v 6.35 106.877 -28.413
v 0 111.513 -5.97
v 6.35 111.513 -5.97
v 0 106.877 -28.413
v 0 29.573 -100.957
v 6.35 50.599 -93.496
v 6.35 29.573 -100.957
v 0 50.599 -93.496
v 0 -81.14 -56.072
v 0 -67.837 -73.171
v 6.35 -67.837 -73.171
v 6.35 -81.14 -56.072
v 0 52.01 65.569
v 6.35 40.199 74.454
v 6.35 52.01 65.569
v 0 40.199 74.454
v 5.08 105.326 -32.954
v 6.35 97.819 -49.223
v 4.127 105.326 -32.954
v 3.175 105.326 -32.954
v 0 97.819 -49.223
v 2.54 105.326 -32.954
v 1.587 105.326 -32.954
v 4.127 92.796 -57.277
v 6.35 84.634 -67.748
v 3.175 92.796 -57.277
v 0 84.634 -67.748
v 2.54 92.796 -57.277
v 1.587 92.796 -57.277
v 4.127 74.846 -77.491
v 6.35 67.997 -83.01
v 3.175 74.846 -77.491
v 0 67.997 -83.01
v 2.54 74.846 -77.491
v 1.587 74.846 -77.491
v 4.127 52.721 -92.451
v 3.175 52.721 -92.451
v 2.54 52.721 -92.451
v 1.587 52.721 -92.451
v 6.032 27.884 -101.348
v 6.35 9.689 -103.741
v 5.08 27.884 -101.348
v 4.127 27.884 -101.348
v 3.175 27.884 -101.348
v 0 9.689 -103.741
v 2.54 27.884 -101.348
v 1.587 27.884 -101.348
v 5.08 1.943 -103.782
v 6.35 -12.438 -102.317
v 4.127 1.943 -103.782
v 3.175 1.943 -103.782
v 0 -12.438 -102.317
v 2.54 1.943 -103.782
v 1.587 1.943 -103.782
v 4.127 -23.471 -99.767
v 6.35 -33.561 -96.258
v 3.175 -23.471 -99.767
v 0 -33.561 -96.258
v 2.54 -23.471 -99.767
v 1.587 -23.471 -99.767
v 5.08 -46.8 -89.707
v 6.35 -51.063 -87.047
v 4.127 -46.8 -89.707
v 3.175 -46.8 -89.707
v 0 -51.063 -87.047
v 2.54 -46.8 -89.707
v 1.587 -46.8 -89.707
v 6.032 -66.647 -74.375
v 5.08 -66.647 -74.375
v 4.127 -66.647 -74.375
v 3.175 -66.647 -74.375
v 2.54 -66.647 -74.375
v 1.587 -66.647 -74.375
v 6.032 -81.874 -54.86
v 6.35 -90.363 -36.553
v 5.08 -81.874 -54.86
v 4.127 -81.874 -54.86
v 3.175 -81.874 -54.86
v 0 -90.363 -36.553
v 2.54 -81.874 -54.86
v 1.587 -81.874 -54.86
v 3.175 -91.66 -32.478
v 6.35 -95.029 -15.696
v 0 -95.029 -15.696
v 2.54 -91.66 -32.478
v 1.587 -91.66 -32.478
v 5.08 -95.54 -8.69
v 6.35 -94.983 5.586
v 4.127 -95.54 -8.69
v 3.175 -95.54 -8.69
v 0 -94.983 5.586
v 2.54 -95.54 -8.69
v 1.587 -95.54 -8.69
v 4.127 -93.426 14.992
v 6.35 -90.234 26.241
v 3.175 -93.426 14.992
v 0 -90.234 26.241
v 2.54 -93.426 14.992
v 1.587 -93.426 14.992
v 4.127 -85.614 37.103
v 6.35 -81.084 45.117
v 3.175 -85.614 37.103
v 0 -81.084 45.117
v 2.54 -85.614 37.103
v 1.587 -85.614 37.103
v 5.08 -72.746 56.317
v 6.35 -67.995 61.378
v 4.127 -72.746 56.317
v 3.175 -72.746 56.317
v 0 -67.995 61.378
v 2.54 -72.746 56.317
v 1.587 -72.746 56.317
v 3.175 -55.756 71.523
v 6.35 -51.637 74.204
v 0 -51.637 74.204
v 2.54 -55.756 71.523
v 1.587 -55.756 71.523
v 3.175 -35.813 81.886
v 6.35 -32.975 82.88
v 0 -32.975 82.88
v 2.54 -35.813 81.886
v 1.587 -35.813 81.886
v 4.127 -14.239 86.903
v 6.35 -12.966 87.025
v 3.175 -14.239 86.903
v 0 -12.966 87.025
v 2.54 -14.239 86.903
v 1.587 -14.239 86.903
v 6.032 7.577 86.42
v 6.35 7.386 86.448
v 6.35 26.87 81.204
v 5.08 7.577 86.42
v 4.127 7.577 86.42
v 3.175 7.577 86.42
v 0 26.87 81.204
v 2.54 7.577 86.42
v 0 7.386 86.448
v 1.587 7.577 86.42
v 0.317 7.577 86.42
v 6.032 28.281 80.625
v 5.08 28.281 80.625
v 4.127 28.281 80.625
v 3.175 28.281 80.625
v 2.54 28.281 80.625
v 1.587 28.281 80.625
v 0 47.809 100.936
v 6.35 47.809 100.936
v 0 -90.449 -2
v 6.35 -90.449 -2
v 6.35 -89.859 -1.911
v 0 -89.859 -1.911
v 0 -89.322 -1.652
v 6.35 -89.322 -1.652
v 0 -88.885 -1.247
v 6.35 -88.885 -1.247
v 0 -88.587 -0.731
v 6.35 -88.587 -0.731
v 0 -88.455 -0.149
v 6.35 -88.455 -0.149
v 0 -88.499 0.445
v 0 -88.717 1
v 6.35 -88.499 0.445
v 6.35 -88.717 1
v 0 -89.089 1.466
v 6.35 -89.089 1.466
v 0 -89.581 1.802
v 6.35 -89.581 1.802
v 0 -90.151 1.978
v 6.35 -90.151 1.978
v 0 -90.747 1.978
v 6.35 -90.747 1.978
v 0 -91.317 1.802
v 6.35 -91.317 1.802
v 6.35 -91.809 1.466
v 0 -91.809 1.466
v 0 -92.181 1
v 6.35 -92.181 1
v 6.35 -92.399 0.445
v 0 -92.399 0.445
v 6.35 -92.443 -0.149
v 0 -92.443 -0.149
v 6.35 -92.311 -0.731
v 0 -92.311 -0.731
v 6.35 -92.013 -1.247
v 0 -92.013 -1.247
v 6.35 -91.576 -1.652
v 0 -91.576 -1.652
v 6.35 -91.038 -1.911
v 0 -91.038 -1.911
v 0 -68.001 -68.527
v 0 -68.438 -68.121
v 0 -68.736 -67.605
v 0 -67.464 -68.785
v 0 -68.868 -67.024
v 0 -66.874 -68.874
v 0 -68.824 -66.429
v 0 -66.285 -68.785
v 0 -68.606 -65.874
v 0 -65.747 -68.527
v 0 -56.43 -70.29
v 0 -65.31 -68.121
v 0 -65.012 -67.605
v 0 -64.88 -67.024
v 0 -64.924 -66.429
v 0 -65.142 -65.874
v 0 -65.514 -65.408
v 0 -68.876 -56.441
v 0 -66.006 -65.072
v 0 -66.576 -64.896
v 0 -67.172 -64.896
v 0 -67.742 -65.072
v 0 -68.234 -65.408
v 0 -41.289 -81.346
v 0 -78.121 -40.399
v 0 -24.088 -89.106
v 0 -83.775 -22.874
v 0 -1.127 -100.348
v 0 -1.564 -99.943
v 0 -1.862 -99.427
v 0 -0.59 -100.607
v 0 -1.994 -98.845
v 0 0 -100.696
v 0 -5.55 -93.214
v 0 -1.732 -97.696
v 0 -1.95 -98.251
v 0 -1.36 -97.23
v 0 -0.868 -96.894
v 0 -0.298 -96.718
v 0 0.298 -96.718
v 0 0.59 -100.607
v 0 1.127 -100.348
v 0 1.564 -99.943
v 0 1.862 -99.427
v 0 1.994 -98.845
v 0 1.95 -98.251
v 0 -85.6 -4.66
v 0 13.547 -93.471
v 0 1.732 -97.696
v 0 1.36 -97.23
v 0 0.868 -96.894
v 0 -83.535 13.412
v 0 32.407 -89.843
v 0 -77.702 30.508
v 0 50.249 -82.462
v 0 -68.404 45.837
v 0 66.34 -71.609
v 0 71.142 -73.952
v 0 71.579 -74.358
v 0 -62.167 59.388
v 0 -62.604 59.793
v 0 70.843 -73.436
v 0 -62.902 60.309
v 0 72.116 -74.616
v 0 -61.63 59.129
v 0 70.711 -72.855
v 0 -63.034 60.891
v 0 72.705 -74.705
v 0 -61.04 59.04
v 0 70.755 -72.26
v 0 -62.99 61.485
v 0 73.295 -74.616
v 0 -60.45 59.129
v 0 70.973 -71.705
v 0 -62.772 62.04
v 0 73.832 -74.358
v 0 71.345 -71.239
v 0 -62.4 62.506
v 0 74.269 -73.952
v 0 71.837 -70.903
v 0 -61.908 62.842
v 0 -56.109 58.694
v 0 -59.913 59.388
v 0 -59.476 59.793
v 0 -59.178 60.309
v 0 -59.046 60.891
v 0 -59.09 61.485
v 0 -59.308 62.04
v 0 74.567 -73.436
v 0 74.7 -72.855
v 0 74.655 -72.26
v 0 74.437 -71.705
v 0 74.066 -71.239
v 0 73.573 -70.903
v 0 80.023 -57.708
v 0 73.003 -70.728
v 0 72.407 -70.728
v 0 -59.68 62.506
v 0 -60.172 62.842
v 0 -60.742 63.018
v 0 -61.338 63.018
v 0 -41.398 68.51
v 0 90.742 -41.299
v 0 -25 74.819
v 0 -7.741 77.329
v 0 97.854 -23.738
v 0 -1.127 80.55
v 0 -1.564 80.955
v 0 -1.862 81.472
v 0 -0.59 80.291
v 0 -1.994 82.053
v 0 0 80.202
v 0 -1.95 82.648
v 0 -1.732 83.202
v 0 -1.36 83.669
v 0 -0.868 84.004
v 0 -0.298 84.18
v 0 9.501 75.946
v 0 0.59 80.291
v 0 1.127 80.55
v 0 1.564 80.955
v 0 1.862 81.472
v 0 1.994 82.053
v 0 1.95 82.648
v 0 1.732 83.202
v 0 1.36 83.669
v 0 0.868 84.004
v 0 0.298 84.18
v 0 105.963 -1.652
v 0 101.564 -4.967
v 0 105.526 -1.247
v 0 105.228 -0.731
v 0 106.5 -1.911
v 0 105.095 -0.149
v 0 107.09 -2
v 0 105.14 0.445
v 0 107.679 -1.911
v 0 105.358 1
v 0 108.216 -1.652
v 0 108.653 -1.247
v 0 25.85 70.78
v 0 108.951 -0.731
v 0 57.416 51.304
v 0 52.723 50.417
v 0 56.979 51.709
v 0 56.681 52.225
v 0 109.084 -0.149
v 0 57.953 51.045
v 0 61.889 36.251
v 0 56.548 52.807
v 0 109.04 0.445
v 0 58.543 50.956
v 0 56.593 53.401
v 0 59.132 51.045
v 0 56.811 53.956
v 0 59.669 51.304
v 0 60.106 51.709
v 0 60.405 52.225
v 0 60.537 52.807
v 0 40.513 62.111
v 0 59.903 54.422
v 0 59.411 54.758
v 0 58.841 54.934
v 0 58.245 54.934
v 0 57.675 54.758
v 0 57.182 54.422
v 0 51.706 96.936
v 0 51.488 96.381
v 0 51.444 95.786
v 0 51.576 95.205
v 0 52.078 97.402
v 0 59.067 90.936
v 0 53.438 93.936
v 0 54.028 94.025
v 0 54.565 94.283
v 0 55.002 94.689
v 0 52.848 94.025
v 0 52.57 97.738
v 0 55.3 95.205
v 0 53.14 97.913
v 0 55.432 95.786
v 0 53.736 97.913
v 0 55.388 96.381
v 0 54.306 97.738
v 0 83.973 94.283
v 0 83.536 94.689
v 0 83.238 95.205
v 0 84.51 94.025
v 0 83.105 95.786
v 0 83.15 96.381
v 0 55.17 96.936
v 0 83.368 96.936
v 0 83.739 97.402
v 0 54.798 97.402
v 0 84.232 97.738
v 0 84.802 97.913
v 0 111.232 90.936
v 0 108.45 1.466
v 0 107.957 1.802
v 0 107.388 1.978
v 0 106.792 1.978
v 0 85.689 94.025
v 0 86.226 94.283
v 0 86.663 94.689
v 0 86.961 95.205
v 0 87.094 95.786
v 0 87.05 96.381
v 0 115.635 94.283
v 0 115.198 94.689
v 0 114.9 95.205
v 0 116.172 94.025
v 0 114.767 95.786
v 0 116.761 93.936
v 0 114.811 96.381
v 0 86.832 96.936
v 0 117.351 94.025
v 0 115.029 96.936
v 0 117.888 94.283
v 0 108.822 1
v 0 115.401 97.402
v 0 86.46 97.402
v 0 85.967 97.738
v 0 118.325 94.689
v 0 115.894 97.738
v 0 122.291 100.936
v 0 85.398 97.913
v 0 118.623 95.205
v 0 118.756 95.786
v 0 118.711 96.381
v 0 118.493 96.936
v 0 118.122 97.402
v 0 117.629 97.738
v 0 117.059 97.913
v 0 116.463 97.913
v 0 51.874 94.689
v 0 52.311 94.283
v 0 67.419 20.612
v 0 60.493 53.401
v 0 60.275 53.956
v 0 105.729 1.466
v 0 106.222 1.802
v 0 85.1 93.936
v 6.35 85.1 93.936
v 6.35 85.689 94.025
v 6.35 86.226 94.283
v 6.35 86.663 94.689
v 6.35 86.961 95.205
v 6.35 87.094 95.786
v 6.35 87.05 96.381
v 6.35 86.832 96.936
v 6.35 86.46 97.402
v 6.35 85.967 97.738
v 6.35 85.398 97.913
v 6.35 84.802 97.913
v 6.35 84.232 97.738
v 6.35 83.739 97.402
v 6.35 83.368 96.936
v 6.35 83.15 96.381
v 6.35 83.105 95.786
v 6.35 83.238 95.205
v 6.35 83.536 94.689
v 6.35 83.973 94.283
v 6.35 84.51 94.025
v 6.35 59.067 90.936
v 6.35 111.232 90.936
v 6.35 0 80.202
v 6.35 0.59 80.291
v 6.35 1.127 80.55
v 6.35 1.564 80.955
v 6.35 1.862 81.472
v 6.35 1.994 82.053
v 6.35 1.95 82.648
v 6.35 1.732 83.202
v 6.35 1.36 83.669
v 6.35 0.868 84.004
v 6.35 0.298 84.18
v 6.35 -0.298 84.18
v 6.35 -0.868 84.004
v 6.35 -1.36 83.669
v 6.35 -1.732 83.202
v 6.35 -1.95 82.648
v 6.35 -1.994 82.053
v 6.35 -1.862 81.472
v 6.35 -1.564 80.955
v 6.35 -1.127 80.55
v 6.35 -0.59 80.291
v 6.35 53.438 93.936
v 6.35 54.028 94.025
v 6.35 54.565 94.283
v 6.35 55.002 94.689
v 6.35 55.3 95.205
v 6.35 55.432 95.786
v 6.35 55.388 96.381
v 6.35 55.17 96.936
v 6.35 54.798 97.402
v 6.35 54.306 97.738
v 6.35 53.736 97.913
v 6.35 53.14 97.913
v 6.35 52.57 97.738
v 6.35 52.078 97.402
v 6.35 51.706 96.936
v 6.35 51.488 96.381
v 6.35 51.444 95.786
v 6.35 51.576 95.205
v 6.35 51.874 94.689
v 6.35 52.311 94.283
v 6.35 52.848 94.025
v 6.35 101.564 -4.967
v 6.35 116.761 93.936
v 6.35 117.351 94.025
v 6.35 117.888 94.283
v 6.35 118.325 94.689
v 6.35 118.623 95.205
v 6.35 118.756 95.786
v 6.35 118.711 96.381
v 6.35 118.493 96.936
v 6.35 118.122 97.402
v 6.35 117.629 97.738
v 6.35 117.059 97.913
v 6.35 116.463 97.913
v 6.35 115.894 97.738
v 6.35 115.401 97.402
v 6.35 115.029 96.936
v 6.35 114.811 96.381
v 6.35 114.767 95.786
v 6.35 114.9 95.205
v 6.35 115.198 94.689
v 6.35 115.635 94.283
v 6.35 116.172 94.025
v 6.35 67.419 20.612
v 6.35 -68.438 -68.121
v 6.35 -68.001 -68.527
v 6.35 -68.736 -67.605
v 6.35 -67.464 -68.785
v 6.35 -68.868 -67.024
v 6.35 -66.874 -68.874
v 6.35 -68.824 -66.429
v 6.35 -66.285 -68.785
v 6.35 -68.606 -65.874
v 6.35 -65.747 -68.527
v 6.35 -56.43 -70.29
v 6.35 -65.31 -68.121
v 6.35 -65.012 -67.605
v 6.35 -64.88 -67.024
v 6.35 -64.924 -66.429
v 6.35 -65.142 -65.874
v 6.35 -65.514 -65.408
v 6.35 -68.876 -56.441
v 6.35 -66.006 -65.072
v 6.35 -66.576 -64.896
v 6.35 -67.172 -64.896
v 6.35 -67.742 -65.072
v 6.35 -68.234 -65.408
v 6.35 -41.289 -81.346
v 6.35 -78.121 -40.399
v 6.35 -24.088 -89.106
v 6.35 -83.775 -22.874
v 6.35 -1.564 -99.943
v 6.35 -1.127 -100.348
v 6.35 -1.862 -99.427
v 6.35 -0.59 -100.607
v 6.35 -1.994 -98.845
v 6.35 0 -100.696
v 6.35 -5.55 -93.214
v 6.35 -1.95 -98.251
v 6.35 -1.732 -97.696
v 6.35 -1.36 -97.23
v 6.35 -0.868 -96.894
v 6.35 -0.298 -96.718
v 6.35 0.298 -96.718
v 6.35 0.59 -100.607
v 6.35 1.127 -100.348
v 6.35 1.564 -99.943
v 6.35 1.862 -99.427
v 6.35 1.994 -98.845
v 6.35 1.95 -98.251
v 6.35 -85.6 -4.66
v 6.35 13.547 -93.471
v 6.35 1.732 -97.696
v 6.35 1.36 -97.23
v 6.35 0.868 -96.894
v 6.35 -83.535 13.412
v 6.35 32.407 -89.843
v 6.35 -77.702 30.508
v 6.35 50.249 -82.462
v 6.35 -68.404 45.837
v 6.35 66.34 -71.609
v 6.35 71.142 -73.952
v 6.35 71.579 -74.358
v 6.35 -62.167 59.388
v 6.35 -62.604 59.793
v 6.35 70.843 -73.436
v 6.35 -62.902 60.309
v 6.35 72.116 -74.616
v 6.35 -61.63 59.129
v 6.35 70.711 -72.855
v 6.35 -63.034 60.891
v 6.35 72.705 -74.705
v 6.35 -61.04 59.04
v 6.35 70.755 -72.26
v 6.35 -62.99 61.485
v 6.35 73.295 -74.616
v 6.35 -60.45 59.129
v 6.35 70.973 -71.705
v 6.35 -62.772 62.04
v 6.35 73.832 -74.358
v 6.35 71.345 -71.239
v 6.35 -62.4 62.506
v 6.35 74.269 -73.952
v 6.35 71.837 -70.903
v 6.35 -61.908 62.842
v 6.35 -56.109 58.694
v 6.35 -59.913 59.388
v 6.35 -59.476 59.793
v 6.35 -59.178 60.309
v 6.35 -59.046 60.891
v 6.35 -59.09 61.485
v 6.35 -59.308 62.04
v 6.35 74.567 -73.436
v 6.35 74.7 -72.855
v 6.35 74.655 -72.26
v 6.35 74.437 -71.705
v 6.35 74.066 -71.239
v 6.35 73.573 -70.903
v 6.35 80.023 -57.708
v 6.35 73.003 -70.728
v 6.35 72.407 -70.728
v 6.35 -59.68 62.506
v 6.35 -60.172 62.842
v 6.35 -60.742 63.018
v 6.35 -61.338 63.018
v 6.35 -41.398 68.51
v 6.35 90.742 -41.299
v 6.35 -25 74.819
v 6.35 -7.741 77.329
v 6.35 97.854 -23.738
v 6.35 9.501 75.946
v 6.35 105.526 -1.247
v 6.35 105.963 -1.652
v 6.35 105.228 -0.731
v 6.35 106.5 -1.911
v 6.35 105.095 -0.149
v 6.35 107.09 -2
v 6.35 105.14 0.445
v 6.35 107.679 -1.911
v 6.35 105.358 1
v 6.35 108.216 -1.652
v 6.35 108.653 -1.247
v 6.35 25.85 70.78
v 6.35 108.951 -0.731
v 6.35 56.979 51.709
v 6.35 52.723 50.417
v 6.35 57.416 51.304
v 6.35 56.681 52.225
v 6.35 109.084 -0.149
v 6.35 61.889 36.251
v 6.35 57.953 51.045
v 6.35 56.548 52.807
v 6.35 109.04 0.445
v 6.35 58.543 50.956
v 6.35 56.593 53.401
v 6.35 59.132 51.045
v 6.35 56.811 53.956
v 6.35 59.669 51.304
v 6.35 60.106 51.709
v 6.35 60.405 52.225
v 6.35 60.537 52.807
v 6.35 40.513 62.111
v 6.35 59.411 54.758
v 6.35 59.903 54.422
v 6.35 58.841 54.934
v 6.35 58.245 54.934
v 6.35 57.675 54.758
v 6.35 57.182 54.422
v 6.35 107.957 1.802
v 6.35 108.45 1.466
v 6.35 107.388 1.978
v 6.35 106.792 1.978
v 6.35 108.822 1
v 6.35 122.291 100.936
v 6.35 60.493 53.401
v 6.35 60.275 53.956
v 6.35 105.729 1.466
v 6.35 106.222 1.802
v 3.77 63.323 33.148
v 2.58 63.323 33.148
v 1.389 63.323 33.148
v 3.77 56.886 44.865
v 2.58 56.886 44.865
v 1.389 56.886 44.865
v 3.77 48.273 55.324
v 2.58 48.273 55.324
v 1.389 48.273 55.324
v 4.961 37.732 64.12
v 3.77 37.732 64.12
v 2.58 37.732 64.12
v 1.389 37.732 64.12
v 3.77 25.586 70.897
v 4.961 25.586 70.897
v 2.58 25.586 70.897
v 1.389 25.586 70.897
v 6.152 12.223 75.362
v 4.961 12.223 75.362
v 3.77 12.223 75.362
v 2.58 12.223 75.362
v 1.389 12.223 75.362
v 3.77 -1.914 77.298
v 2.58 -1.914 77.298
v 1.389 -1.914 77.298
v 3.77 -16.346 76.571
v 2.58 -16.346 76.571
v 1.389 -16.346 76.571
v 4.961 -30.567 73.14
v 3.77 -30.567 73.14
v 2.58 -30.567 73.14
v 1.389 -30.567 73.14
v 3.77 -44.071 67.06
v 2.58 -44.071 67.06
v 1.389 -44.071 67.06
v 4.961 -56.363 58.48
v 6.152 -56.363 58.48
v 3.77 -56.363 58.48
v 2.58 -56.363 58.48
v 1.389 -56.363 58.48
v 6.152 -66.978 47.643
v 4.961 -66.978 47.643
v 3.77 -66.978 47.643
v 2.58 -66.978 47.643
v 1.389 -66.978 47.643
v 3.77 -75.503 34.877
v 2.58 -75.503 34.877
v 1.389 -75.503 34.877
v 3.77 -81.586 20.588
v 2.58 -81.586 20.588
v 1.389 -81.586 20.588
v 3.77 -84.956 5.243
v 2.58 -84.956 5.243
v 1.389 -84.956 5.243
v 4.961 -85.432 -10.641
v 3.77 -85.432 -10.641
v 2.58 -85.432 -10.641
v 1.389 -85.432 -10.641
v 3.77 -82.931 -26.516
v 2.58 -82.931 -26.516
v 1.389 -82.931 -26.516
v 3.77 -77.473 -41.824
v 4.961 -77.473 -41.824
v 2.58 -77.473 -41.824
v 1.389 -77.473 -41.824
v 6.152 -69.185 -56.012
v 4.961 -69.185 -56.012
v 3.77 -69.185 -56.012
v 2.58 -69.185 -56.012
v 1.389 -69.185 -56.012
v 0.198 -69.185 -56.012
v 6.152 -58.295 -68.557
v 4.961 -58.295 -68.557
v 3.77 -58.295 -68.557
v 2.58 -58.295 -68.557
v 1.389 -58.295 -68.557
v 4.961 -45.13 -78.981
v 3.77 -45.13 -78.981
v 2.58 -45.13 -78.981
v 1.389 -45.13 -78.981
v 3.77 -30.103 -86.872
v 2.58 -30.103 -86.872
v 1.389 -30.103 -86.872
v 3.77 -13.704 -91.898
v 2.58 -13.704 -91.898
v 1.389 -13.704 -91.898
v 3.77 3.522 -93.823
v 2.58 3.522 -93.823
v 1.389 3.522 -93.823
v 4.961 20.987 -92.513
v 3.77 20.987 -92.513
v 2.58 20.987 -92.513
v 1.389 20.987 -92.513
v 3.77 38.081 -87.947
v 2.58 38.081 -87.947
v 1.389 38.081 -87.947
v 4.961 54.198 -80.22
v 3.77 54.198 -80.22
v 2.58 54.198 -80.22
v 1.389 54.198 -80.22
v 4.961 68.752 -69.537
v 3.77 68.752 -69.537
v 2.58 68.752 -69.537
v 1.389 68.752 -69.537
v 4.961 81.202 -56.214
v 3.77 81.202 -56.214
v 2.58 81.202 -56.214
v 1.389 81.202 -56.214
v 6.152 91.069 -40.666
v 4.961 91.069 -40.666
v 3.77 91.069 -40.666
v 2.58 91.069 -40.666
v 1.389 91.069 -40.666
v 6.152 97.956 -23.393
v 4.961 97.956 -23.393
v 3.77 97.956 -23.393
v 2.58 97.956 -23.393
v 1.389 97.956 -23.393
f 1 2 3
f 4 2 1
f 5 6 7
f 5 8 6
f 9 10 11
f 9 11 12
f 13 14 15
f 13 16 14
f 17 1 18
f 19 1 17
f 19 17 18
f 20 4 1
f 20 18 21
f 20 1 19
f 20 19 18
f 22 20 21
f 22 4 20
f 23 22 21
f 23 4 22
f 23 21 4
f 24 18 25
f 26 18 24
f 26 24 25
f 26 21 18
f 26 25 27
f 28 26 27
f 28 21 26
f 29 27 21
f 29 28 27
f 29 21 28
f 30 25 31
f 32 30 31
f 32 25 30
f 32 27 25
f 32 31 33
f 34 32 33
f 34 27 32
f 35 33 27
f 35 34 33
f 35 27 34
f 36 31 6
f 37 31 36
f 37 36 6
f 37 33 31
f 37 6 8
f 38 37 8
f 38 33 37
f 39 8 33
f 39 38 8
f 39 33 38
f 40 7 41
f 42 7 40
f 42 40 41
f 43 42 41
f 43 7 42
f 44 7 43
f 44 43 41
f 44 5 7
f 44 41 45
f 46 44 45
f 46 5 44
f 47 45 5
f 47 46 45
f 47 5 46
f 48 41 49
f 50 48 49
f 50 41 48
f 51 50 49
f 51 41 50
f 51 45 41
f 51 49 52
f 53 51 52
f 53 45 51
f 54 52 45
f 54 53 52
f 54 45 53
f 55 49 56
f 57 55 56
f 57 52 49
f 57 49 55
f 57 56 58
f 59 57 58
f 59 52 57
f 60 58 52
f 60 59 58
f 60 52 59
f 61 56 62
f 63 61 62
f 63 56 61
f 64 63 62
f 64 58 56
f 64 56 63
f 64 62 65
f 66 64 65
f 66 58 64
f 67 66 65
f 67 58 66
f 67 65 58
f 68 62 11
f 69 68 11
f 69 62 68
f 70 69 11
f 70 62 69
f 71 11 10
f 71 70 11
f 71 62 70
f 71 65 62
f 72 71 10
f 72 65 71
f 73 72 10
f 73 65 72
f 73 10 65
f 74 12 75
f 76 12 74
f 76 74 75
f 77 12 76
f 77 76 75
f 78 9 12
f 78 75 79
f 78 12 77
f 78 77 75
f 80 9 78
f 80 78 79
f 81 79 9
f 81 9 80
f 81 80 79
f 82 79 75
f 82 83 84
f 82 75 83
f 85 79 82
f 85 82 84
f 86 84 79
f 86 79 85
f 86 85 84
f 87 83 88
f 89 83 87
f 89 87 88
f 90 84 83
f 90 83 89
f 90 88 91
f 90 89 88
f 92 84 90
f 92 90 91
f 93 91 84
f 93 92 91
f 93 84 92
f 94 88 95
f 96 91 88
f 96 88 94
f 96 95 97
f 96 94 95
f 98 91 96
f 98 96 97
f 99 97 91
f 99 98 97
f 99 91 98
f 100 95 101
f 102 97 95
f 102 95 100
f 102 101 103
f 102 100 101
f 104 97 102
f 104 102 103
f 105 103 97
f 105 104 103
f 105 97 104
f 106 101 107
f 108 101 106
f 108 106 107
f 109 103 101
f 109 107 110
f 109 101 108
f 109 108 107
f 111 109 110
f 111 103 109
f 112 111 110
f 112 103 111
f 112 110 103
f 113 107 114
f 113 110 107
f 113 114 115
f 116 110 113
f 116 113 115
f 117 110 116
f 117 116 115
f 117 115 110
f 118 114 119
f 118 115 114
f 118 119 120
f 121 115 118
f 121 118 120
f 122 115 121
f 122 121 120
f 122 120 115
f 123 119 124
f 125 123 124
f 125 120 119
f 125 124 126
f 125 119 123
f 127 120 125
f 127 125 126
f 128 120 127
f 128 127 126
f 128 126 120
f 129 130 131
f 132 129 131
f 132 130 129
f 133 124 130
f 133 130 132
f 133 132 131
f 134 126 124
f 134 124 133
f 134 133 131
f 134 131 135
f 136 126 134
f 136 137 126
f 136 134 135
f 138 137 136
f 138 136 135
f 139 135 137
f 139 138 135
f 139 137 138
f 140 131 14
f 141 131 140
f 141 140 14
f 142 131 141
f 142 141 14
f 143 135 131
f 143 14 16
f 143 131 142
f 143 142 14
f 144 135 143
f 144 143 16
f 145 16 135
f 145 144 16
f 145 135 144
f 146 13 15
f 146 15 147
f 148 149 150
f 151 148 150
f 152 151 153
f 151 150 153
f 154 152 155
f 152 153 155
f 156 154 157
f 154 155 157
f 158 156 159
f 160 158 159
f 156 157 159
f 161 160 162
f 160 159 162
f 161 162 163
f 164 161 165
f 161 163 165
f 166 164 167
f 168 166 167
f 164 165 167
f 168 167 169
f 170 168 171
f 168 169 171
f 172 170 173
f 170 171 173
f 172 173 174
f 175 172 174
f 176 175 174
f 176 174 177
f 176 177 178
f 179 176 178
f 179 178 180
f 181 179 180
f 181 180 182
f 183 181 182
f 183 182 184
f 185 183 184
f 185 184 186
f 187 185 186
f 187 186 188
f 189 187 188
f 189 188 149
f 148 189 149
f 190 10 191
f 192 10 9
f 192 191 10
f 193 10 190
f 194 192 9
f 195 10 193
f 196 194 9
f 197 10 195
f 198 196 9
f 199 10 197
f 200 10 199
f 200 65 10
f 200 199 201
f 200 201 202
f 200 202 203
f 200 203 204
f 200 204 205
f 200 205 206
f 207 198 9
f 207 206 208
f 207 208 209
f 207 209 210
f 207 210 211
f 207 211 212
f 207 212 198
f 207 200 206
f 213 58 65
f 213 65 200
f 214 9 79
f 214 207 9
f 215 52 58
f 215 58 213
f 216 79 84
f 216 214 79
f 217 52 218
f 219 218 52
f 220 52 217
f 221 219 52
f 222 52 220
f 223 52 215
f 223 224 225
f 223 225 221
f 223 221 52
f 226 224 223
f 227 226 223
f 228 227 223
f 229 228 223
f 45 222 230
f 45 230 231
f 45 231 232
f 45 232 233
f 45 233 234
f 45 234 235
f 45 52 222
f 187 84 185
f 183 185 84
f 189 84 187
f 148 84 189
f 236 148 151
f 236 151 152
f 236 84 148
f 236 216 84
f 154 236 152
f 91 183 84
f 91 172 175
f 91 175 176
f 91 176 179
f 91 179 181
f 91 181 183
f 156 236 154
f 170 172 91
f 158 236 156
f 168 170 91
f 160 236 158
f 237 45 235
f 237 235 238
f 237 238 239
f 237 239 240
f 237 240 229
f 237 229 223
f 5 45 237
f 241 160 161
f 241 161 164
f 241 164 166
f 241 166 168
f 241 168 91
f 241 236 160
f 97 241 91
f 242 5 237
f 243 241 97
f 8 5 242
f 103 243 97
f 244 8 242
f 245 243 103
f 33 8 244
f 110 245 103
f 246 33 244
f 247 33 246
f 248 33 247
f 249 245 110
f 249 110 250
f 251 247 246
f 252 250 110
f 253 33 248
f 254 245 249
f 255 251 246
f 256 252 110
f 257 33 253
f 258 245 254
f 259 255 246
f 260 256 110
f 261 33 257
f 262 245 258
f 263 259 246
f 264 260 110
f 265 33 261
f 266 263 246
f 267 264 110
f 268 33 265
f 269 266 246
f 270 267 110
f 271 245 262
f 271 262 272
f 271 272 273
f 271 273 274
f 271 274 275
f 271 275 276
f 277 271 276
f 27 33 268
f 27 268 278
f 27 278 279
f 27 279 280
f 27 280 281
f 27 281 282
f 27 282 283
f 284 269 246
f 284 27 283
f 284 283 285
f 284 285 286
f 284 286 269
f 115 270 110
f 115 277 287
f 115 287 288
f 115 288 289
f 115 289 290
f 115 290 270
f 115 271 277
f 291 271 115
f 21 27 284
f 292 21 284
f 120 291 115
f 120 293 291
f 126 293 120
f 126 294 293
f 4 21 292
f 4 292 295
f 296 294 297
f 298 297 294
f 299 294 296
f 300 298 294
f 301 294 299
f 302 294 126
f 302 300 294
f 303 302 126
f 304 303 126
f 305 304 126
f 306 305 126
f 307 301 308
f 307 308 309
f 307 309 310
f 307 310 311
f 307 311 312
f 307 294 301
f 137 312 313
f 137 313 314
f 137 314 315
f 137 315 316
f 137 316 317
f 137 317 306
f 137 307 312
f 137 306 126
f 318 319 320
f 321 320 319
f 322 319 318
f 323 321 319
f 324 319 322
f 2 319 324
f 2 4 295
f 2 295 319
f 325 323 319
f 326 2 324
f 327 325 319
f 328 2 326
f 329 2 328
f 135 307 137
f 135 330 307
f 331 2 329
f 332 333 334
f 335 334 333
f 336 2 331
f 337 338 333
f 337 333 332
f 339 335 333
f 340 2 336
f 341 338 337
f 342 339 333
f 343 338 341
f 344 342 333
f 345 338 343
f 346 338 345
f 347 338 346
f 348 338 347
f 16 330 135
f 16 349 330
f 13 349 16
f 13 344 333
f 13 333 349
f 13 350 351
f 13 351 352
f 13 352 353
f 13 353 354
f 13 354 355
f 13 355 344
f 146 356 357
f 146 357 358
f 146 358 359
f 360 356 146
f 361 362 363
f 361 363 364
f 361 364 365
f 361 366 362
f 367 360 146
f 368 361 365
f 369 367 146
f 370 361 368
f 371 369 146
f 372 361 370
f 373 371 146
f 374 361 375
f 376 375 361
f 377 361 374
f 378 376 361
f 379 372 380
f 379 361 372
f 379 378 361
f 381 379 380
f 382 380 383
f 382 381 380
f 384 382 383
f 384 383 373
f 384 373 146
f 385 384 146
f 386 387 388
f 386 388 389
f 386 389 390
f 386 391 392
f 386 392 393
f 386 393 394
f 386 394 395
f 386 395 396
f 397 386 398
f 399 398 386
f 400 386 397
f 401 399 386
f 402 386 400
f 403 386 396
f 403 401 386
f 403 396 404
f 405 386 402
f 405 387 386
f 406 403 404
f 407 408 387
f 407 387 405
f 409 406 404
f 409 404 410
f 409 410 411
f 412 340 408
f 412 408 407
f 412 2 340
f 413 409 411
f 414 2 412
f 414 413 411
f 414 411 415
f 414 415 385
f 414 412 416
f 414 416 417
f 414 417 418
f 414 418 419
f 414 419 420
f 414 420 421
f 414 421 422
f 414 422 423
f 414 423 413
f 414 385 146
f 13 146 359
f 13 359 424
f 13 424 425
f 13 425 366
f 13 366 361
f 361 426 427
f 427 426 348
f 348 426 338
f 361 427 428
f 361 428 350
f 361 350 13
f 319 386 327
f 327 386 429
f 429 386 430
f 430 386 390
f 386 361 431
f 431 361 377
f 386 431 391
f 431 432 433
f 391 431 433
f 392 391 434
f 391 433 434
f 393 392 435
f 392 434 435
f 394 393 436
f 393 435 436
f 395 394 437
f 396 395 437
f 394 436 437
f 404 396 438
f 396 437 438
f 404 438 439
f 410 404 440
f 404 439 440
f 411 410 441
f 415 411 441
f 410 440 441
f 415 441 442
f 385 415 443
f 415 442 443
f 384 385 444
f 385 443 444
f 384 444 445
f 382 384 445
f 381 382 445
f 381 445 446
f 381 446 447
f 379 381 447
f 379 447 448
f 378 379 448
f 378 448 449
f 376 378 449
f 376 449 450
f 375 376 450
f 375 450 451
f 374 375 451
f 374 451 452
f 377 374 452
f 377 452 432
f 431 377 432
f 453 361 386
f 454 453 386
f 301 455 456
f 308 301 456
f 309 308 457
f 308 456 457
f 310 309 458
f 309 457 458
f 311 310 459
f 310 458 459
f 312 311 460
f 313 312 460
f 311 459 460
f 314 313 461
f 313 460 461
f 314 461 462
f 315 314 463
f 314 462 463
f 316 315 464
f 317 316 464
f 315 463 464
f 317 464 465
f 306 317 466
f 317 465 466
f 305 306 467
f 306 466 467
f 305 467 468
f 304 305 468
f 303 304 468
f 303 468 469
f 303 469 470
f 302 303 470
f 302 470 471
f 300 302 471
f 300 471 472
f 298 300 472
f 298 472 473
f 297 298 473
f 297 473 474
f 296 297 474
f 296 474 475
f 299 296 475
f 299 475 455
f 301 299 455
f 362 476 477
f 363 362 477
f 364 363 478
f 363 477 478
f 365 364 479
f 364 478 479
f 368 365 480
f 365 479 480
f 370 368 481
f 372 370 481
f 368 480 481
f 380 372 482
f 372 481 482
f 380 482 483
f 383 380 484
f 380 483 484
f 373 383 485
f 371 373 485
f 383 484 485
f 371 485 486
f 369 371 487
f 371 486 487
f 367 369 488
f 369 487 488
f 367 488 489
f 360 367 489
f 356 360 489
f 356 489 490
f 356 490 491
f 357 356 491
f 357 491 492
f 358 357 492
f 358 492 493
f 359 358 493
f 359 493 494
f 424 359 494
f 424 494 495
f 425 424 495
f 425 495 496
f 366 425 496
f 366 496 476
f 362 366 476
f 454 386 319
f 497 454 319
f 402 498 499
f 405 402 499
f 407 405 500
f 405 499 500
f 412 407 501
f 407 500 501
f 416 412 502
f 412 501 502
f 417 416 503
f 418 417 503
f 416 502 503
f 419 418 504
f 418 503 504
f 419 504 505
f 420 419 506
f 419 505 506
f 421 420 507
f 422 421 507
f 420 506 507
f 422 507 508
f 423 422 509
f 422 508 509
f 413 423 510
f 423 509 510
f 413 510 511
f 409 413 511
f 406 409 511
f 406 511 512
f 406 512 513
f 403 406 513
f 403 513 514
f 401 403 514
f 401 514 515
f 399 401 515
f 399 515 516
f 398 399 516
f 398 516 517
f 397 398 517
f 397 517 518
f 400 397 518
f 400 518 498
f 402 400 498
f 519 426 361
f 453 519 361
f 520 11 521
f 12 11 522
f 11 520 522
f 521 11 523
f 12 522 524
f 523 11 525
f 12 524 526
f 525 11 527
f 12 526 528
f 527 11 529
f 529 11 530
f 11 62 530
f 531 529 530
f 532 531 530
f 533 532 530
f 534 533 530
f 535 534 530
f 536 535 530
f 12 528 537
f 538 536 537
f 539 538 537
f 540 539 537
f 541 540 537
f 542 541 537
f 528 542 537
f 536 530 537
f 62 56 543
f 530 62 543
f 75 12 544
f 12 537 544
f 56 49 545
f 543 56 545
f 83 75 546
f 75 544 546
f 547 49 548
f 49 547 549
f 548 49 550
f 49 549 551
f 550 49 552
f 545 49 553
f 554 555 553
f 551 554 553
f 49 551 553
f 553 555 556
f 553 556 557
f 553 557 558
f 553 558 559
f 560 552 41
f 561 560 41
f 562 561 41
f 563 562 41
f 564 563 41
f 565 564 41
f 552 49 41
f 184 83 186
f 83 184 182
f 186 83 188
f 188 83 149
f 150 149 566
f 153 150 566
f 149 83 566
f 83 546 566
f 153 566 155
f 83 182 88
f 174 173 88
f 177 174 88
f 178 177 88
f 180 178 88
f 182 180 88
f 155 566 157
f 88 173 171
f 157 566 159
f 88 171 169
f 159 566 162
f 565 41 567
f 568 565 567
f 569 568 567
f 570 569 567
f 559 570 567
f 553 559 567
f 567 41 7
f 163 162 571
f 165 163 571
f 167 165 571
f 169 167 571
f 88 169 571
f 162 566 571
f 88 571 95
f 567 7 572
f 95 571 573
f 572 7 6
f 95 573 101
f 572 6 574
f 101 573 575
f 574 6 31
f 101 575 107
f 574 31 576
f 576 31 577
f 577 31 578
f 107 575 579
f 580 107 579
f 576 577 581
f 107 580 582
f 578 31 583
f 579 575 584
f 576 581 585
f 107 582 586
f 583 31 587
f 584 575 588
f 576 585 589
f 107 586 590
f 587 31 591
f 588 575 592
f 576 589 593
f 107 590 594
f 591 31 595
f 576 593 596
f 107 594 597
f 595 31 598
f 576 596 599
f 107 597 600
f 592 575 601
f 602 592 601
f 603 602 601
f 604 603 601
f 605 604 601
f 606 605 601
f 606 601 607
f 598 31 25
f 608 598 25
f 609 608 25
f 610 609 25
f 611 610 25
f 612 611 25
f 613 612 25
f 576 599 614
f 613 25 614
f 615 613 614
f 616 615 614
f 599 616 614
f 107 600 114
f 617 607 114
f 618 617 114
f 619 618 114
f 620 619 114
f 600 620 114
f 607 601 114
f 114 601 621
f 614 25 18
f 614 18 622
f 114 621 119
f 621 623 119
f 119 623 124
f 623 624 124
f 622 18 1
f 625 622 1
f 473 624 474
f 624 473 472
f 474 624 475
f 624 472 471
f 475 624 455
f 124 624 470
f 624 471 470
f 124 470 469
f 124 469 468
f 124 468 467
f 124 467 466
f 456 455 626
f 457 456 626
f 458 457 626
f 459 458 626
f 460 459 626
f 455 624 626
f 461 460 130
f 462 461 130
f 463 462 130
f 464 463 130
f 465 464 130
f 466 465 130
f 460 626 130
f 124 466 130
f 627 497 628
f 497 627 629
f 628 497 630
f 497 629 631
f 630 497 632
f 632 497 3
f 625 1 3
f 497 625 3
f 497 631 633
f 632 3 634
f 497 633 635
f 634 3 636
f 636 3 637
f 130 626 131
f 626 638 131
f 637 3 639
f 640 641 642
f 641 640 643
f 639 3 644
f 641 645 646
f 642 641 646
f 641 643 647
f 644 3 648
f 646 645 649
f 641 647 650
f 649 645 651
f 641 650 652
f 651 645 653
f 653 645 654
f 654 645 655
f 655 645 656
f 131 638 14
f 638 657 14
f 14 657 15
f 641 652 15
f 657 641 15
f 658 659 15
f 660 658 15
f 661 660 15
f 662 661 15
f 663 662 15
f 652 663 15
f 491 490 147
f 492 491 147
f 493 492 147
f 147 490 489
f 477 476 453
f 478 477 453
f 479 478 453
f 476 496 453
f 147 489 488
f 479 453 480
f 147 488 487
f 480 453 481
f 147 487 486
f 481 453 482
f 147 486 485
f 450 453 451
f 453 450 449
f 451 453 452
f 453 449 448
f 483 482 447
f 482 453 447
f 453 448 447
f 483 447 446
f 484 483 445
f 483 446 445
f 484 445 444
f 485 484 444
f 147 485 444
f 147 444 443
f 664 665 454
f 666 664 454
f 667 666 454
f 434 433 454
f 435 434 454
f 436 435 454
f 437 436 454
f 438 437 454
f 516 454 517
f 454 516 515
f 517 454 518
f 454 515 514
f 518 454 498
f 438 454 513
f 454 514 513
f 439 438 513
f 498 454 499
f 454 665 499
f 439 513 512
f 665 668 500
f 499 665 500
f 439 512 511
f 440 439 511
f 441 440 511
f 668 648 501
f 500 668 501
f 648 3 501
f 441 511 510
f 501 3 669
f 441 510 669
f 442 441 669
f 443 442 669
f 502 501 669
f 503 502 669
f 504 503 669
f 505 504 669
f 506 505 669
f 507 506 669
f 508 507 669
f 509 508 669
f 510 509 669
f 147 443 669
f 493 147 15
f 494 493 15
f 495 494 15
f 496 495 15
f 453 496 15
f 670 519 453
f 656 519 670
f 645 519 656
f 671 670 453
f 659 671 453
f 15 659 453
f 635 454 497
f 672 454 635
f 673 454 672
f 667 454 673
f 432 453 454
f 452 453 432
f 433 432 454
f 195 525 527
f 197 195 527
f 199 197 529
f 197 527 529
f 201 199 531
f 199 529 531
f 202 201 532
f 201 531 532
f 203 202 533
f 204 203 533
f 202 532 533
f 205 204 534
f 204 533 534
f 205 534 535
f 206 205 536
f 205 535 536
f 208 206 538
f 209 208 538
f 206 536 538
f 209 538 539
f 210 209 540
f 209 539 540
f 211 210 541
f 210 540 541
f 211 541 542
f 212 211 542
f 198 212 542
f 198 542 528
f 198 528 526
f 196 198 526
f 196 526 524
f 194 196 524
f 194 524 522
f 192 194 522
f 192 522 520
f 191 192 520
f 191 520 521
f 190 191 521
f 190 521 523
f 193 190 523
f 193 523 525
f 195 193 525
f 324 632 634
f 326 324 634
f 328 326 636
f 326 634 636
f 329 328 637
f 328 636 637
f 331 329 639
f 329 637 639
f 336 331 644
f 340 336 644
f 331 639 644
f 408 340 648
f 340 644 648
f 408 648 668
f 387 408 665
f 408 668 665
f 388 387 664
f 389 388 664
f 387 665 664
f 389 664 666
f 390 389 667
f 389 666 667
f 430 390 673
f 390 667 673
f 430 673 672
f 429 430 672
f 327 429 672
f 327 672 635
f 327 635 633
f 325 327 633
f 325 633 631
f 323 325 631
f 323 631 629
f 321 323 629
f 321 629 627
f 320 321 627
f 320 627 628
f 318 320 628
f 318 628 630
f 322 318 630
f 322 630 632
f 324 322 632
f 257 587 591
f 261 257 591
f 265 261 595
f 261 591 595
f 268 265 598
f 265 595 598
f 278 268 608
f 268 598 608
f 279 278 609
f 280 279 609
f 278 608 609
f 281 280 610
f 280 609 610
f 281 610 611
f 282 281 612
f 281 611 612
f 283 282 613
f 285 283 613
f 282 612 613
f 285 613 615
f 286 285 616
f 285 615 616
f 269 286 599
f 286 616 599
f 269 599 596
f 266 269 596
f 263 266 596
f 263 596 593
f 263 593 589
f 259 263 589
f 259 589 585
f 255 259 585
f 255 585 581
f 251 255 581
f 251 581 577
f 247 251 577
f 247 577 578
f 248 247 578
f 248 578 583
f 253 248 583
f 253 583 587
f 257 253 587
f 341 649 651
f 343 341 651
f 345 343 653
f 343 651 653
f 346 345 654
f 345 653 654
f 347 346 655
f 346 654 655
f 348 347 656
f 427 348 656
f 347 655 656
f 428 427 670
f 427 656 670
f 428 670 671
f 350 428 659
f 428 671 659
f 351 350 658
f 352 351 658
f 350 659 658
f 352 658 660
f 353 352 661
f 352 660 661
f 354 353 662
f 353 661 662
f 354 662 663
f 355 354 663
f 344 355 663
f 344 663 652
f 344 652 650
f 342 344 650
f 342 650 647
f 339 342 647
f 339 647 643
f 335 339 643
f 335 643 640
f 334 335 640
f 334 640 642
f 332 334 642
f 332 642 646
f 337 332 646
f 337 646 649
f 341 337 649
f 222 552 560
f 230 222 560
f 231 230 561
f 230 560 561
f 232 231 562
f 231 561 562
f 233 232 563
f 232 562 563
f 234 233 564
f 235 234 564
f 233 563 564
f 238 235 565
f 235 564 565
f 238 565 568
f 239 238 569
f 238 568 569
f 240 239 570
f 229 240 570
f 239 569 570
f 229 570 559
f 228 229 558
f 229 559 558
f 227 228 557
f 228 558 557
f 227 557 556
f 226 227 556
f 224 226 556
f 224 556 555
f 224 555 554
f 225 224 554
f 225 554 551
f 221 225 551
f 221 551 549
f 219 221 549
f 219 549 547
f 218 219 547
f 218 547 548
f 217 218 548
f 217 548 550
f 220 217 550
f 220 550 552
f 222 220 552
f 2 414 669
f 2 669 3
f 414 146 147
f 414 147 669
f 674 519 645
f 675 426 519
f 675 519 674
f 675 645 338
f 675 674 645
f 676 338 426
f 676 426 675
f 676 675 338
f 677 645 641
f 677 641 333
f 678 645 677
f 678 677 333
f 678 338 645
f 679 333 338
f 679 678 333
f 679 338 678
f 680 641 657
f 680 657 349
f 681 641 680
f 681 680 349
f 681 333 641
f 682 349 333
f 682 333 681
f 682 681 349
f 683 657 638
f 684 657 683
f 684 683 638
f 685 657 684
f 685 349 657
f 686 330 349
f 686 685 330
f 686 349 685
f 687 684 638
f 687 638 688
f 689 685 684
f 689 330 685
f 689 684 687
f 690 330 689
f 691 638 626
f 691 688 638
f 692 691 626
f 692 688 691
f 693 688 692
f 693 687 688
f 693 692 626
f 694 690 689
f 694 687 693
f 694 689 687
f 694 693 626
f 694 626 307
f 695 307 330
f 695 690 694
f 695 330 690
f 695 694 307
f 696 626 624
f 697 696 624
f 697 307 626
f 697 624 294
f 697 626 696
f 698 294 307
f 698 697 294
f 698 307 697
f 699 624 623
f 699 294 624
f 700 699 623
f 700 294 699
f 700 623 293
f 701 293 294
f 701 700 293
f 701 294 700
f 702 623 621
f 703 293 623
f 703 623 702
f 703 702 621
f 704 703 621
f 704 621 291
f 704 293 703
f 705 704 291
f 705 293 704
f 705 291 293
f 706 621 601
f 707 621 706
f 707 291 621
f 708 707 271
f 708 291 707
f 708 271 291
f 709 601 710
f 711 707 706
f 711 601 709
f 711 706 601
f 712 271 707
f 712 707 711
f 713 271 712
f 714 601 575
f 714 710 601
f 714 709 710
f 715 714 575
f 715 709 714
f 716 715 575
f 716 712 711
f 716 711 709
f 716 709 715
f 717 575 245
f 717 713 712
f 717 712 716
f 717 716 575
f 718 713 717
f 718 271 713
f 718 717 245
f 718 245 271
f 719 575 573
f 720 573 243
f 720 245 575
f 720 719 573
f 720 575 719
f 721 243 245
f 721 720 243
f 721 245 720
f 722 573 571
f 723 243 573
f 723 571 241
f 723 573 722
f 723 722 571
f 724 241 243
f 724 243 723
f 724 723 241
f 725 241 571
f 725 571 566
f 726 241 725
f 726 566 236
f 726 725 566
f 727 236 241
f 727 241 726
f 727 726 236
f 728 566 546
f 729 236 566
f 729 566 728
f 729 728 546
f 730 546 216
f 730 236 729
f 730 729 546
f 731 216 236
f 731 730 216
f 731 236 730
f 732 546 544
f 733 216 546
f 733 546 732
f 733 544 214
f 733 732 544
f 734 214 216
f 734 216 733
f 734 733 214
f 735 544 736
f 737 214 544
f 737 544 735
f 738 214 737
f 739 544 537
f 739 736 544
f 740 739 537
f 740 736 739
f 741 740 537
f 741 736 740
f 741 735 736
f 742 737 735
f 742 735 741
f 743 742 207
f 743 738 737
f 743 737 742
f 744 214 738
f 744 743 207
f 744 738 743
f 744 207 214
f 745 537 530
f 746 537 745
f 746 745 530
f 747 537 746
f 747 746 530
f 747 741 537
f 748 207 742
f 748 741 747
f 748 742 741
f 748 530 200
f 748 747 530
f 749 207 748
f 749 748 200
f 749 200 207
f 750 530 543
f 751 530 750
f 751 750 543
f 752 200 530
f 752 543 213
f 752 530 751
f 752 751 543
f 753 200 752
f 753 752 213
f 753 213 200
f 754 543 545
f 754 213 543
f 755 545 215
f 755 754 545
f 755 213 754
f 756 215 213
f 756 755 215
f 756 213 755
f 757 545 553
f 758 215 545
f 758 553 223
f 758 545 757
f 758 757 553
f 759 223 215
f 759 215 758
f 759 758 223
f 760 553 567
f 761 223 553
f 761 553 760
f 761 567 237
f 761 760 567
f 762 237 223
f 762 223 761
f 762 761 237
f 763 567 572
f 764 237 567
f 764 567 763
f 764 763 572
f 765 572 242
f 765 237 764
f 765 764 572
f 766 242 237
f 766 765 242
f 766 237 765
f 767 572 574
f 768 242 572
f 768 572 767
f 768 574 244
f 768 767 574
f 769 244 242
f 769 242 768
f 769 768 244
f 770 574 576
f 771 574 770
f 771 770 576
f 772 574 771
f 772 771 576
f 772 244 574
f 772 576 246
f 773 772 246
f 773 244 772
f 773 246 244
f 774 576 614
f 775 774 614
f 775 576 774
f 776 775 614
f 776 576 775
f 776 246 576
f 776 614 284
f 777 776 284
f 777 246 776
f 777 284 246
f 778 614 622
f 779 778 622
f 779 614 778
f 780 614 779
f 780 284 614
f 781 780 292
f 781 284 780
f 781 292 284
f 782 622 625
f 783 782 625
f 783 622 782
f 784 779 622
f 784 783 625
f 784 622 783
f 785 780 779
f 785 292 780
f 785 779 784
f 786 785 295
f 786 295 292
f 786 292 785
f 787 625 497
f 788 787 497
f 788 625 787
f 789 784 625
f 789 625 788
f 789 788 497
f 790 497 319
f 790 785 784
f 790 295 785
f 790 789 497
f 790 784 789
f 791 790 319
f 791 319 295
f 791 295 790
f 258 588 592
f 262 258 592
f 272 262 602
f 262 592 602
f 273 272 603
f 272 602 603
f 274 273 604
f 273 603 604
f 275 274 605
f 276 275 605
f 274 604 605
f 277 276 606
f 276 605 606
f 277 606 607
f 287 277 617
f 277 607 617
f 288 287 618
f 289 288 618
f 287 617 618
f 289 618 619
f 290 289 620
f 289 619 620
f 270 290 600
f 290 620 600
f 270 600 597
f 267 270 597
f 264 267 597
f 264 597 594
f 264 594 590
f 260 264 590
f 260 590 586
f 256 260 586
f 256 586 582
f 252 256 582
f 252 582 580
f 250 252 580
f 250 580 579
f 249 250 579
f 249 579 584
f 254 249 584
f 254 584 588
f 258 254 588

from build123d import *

# Parameters (mm, degrees)
BOSS_EXTRUDE1_DEPTH = 6.35
SKETCH11_R          = 2
CUT_EXTRUDE2_DEPTH  = 10


with BuildPart() as part:
    # Sketch10 → Boss-Extrude1 (new body)
    with BuildSketch(Plane(origin=(0, 0, 0), x_dir=(0, 0, -1), z_dir=(1, 0, 0))):
        with BuildLine():
            Line((-65.56933734, 52.009531221), (-100.935679824, 47.808985699))
            Line((-100.935679824, 47.808985699), (-100.935679824, 122.29075479))
            Line((-100.935679824, 122.29075479), (5.970340966, 111.513169224))
            add(Edge.make_bspline(
                [(5.970340966, 111.513169224), (9.050174513, 111.20267998), (15.195754527, 110.322198965), (27.224457069, 107.560584888), (41.672600889, 102.269141777), (57.583217011, 93.200335773), (76.34944741, 77.877389952), (94.274449289, 53.53377411), (104.843460982, 19.443777188), (103.677945005, -15.636484697), (91.289552438, -47.848309946), (69.405777179, -73.770277552), (40.739036605, -90.784845908), (8.654881454, -97.341351398), (-23.220610692, -93.091773694), (-51.414586087, -78.887047742), (-72.979776783, -56.641213756), (-85.804607758, -29.085280645), (-88.816261681, 0.571051967), (-83.191535024, 24.252063706), (-74.366432128, 41.075630131), (-68.698633198, 48.535069634), (-65.56933734, 52.009531221)],
                knots=[0.103071112, 0.103071112, 0.103071112, 0.103071112, 0.117085626, 0.13110014, 0.159129168, 0.187158196, 0.215187223, 0.271245279, 0.327303334, 0.38336139, 0.439419445, 0.495477501, 0.551535556, 0.607593612, 0.663651667, 0.719709723, 0.775767778, 0.831825834, 0.887883889, 0.943941945, 0.971970972, 1, 1, 1, 1], degree=3))
        make_face()
        with BuildLine():
            Line((-20.612205183, 67.419485295), (-90.935679824, 59.066997144))
            Line((-90.935679824, 59.066997144), (-90.935679824, 111.231929858))
            Line((-90.935679824, 111.231929858), (4.967288842, 101.563602076))
            add(Edge.make_bspline(
                [(-20.612205183, 67.419485295), (-24.877082573, 66.455267856), (-29.081224373, 65.085352217), (-37.21559395, 61.560478152), (-41.145637536, 59.405543875), (-48.584738117, 54.365833517), (-52.093616671, 51.481116625), (-58.554517239, 45.064659766), (-61.506373232, 41.533012683), (-66.733754258, 33.93084433), (-69.009132051, 29.860447027), (-72.785201264, 21.31099306), (-74.285770034, 16.832087637), (-76.439055333, 7.613754029), (-77.091678837, 2.874499464), (-77.504351301, -6.703367116), (-77.264340924, -11.541788953), (-75.877767223, -21.149276623), (-74.731181162, -25.918142271), (-71.549462985, -35.216137703), (-69.514346369, -39.745064349), (-64.605672967, -48.397213397), (-61.732170197, -52.520237022), (-55.227886345, -60.20508067), (-51.597196674, -63.766713581), (-43.688569666, -70.189562344), (-39.41075863, -73.050609782), (-30.343511502, -77.954720143), (-25.554232771, -79.997639846), (-15.620993672, -83.174272641), (-10.477216691, -84.30787342), (-0.008113237, -85.604846154), (5.317009901, -85.76814141), (15.965310371, -85.096533315), (21.28827135, -84.261592387), (31.744712207, -81.600321197), (36.87797025, -79.773994641), (46.77003278, -75.172055644), (51.528617832, -72.396488903), (60.495574952, -65.972727389), (64.703737934, -62.324619511), (72.409763445, -54.264994481), (75.907434968, -49.853603117), (82.054093398, -40.405990072), (84.702914605, -35.369929323), (89.040569877, -24.836599811), (90.729269998, -19.339522034), (93.066981329, -8.06752417), (93.715895777, -2.292818854), (93.929415548, 9.337436952), (93.493965482, 15.192756131), (91.531515002, 26.780331551), (90.004503349, 32.512347913), (85.890076353, 43.649598298), (83.302695164, 49.054592305), (77.136723273, 59.34149905), (73.55821175, 64.223180225), (65.515517909, 73.281690263), (61.051457803, 77.458304454), (51.376519854, 84.946163767), (46.165803684, 88.257219093), (35.165447244, 93.88079599), (29.376003057, 96.19315988), (17.40973727, 99.718780964), (11.233139789, 100.931918806), (4.967288842, 101.563602076)],
                knots=[0, 0, 0, 0, 0.03125, 0.03125, 0.0625, 0.0625, 0.09375, 0.09375, 0.125, 0.125, 0.15625, 0.15625, 0.1875, 0.1875, 0.21875, 0.21875, 0.25, 0.25, 0.28125, 0.28125, 0.3125, 0.3125, 0.34375, 0.34375, 0.375, 0.375, 0.40625, 0.40625, 0.4375, 0.4375, 0.46875, 0.46875, 0.5, 0.5, 0.53125, 0.53125, 0.5625, 0.5625, 0.59375, 0.59375, 0.625, 0.625, 0.65625, 0.65625, 0.6875, 0.6875, 0.71875, 0.71875, 0.75, 0.75, 0.78125, 0.78125, 0.8125, 0.8125, 0.84375, 0.84375, 0.875, 0.875, 0.90625, 0.90625, 0.9375, 0.9375, 0.96875, 0.96875, 1, 1, 1, 1], degree=3))
        make_face(mode=Mode.SUBTRACT)
    extrude(amount=BOSS_EXTRUDE1_DEPTH)

    # Sketch11 → Cut-Extrude2 (cut)
    with BuildSketch(Plane(origin=(6.35, 0, 0), x_dir=(0, 0, -1), z_dir=(1, 0, 0))):
        with Locations((-95.935679824, 116.761342324)):
            Circle(SKETCH11_R)
        with Locations((-95.935679824, 53.437991421)):
            Circle(SKETCH11_R)
        with Locations((-95.935679824, 85.099666873)):
            Circle(SKETCH11_R)
        with Locations((-52.956120261, 58.54277704)):
            Circle(SKETCH11_R)
        with Locations((0, -90.448962865)):
            Circle(SKETCH11_R)
        with Locations((-82.20247918, 0)):
            Circle(SKETCH11_R)
        with Locations((98.695882227, 0)):
            Circle(SKETCH11_R)
        with Locations((0, 107.089716811)):
            Circle(SKETCH11_R)
        with Locations((-61.03999449, -61.03999449)):
            Circle(SKETCH11_R)
        with Locations((66.874078846, -66.874078846)):
            Circle(SKETCH11_R)
        with Locations((72.70516699, 72.70516699)):
            Circle(SKETCH11_R)
    extrude(amount=-CUT_EXTRUDE2_DEPTH, mode=Mode.SUBTRACT)


solid = part.part
